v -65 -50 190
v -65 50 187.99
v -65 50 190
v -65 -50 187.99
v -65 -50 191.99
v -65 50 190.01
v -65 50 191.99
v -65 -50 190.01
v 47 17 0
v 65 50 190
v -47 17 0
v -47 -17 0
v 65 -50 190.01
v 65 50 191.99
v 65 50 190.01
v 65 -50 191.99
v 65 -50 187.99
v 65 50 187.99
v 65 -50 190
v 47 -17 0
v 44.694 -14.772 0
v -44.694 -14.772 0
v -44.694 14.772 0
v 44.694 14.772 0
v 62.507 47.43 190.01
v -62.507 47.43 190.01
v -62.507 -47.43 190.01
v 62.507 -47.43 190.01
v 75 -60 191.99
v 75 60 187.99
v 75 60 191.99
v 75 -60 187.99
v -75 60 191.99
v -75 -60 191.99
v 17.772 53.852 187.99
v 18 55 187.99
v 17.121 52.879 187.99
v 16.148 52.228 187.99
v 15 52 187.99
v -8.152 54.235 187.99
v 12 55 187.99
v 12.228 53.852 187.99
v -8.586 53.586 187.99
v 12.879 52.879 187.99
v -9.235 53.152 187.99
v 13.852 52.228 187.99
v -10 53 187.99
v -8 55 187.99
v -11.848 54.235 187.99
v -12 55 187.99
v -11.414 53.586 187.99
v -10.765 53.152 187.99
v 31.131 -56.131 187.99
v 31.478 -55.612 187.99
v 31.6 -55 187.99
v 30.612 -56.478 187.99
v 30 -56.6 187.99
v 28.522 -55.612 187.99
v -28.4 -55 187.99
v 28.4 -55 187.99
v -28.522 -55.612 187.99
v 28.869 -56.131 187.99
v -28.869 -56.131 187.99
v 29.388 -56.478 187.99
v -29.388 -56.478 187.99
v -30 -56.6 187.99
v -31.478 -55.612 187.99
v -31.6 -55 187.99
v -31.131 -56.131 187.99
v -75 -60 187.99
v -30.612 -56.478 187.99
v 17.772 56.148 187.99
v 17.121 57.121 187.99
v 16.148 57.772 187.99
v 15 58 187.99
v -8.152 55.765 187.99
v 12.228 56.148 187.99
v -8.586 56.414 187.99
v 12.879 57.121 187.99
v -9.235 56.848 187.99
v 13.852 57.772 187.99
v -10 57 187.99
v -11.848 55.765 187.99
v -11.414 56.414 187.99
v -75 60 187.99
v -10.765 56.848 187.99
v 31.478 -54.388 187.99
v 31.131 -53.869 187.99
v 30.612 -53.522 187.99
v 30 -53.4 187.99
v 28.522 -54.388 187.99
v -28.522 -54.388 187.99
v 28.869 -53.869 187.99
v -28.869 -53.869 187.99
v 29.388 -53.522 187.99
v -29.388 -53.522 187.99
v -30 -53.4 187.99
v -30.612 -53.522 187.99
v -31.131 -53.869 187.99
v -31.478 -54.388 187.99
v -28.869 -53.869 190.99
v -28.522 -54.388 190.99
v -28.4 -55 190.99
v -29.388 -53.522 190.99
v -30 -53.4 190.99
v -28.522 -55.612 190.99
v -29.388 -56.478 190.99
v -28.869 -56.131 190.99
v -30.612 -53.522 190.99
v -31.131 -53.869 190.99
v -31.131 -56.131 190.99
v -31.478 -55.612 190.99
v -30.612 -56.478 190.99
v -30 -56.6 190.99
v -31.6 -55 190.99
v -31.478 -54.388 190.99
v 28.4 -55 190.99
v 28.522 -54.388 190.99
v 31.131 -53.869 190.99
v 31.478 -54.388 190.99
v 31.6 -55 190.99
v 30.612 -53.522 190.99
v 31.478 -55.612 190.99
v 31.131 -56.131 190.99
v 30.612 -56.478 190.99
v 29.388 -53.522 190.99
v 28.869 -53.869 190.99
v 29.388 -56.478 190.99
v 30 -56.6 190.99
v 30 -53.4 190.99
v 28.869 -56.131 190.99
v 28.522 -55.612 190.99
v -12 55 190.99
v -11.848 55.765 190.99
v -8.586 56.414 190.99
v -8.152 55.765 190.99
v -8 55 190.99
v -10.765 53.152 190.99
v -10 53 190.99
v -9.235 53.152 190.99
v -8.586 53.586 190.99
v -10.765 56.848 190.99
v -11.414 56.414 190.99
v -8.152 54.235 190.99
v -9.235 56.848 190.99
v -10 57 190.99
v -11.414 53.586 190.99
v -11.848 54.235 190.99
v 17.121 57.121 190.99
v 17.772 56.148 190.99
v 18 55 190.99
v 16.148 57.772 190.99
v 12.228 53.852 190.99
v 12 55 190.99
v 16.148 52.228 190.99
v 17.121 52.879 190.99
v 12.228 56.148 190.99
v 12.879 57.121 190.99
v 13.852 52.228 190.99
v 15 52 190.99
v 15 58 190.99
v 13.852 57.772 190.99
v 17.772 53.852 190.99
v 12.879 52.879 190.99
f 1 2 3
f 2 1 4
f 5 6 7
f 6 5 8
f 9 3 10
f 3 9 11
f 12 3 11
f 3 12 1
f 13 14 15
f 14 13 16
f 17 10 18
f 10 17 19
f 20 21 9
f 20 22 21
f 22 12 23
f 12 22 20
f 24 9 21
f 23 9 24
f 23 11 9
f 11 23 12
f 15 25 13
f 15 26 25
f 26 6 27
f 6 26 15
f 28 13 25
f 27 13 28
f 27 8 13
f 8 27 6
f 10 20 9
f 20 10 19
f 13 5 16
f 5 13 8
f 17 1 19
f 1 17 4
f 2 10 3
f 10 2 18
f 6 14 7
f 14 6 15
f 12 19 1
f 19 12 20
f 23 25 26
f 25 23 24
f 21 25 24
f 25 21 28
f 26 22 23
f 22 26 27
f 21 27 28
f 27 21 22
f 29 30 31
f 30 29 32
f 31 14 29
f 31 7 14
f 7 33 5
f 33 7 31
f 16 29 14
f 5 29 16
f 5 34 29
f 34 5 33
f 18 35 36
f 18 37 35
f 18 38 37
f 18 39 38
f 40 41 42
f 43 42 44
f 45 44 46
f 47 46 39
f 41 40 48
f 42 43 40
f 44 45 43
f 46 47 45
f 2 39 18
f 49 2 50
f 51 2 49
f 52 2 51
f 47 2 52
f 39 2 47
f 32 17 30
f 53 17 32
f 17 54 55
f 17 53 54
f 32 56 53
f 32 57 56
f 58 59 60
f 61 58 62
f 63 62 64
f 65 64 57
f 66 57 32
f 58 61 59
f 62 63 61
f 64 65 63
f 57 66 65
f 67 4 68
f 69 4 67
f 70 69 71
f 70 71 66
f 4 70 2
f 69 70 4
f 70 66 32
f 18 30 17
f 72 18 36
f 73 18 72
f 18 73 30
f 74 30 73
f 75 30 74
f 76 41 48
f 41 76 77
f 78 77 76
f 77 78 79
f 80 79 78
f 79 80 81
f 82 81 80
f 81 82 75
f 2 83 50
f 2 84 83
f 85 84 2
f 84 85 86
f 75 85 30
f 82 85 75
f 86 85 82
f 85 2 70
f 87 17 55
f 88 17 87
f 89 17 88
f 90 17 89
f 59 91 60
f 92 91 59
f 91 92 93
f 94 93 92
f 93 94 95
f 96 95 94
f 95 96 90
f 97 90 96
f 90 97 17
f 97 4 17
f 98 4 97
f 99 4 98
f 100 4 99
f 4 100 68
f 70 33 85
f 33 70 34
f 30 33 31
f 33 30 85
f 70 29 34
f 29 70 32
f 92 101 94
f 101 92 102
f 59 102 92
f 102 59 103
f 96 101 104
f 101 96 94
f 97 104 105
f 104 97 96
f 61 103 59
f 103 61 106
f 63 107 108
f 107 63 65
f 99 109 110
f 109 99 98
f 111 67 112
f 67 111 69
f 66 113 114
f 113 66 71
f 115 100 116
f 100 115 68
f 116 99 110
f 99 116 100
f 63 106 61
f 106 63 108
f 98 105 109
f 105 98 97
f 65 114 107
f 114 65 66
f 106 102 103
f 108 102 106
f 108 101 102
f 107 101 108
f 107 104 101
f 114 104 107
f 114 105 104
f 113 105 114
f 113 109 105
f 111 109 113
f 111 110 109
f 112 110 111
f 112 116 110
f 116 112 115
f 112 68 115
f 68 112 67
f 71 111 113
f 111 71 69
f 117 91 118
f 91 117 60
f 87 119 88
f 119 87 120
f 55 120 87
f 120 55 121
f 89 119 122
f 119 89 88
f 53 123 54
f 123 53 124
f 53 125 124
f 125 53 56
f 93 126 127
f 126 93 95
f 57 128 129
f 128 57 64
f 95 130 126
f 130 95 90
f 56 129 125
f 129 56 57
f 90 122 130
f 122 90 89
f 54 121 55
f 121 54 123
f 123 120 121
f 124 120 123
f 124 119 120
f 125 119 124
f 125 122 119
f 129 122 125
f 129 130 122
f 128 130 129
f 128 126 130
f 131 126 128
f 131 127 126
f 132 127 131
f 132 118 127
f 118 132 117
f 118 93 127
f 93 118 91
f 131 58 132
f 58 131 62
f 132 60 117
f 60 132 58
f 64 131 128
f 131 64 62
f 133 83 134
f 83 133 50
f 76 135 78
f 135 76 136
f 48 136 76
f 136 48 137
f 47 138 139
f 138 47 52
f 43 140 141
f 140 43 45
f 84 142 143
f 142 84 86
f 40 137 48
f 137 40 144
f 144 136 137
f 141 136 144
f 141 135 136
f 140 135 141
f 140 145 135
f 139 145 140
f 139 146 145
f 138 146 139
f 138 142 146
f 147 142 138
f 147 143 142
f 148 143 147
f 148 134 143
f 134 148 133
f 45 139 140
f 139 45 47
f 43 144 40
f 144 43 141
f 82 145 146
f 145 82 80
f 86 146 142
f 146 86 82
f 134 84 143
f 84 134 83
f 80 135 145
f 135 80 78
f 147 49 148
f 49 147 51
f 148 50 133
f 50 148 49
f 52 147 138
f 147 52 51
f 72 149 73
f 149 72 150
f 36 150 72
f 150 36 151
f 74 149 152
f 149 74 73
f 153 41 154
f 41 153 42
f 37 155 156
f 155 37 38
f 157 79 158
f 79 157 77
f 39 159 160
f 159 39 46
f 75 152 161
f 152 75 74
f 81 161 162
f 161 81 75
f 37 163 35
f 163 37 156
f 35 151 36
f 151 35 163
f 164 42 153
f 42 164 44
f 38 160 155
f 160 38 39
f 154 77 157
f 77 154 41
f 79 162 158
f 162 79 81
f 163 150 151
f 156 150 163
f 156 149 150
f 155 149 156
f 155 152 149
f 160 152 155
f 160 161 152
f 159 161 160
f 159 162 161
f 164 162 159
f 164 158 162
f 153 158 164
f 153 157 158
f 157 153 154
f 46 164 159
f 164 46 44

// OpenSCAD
// file: params.scad
// Shared parameters — edit this file only, every part picks these up via
// `include`. Meccanismo: tramoggia (bulk, >=100 sigarette sfuse) -> rullo
// scanalato (singolarizzatore) -> scivolo -> pulsante frontale.
//
// MISURA LE TUE SIGARETTE PRIMA DI STAMPARE. Questi sono valori tipici per
// un formato king-size con filtro (~84mm x ~7.9mm) — verificalo con un
// calibro sulle sigarette che userai davvero (JPS o altro) e correggi.

cig_l      = 84;    // lunghezza sigaretta (mm)
cig_d      = 7.9;   // diametro sigaretta (mm)
clear_ax   = 2;      // gioco assiale (lungo il rullo) per lato
clear_rad  = 1.5;    // gioco radiale nella scanalatura

// --- Rullo scanalato ---------------------------------------------------
flutes       = 8;    // numero di scanalature attorno al rullo
wall         = 3.5;  // parete minima tra due scanalature (robustezza stampa)
shaft_d      = 6;    // foro per accoppiatore albero motore

groove_d   = cig_d + 2*clear_rad;                 // diametro scanalatura
flute_pitch_arc = groove_d + wall;                // passo tra scanalature (arco)
r_pitch    = flute_pitch_arc * flutes / (2*PI);   // raggio al centro delle scanalature
// Il grezzo del rullo si ferma esattamente al raggio r_pitch: ogni
// scanalatura è un foro cilindrico centrato SU quel raggio, quindi viene
// tagliata a metà dalla superficie del grezzo, lasciando un canale a "U"
// aperto verso l'esterno (non un foro cieco tangente alla superficie —
// un tentativo precedente con roller_r = r_pitch + groove_d/2 produceva
// una mesh non manifold, tangente in un solo punto).
roller_r   = r_pitch;                             // raggio esterno rullo (creste)
core_r     = r_pitch - groove_d/2;                // raggio al fondo scanalatura
roller_len = cig_l + 2*clear_ax;

// --- Alloggiamento (housing a "C") --------------------------------------
// Deve coprire anche la sporgenza della sigaretta oltre le creste (la
// scanalatura è più larga della sigaretta per il gioco, quindi la
// sigaretta non sta a filo — protrude di circa clear_rad..2*clear_rad).
housing_clear   = 4;                   // gioco radiale rullo/alloggiamento
housing_ir      = roller_r + housing_clear; // raggio interno alloggiamento
housing_wall    = 3;
housing_or      = housing_ir + housing_wall;
end_plate_t     = 4;

// apertura di carico (sopra, sotto la tramoggia) e di scarico (sotto)
load_gap_deg    = 55;   // ampiezza apertura di carico
discharge_gap_deg = 40; // ampiezza apertura di scarico
// l'apertura di carico è centrata in alto (90°), quella di scarico in
// basso (270°) nel piano di rotazione del rullo (asse orizzontale, vista
// dal fronte lungo l'asse Y)

// --- Tramoggia (hopper) --------------------------------------------------
// Capienza richiesta: >=100 sigarette sfuse. Volume solido di 100 sigarette
// =~ 411 cm3; per cilindretti alla rinfusa il fattore di impaccamento reale
// è basso e variabile (si intasano/incrociano) — 35-50% è una stima
// prudente. Le dimensioni sotto danno un volume utile di ~1.3 L, che
// garantisce >=100 pezzi anche nello scenario pessimistico (35%): vedi il
// conto fatto per questo file (~111 sigarette al 35%, fino a ~158 al 50%).
hopper_top_w   = 130;
hopper_top_d   = 100;
hopper_bot_w   = roller_len + 6;   // combacia con la larghezza del rullo
hopper_bot_d   = 34;
hopper_h       = 190;
hopper_wall    = 2.4;

// --- Bordo/coperchio/serratura tramoggia (hopper.scad + hopper_lid.scad) -
rim_w        = 10;   // sporgenza del bordo oltre l'apertura
rim_t        = 4;
hinge_hole_d = 3.2;
hinge_x      = [-30, 30];  // posizione viti cerniera, lato -Y (fronte)
latch_hole_d = 4;          // foro per il gancio della serratura, lato +Y (retro)
reed_hole_d  = 6;          // foro per il sensore magnetico di sportello chiuso

// --- Mobile esterno (cabinet.scad) — pannelli piatti, non stampati -------
// Un guscio 3D pieno di queste dimensioni non è stampabile in un pezzo
// solo: qui si generano pannelli piatti (taglio laser/CNC/sega) che
// racchiudono il meccanismo, lasciando accessibili solo pulsante,
// feritoia e sportello tramoggia con serratura.
cab_w        = 180;   // larghezza (sx-dx)
cab_d        = 240;   // profondità (fronte-retro)
cab_h        = 420;   // altezza
panel_mat_t  = 9;     // spessore materiale pannelli (legno 9mm o simile — adatta)
cab_back_margin = 15; // margine tra il bordo posteriore e il ritaglio tramoggia
// main file
// Tramoggia (bulk hopper) — stampa 1x. Imbuto che raccoglie le sigarette
// sfuse (>=100) e le convoglia, per gravità, nell'apertura di carico
// dell'alloggiamento (housing.scad). Capacità: vedi il calcolo in
// params.scad (hopper_*).
include <params.scad>

module loft(w1, d1, w2, d2, h) {
    hull() {
        translate([0, 0, h]) linear_extrude(0.01) square([w1, d1], center = true);
        linear_extrude(0.01) square([w2, d2], center = true);
    }
}

// bordo in cima: appoggio per il coperchio (hopper_lid.scad), sede per
// cerniera, serratura e sensore di sportello chiuso — vedi quel file.
// Parametri (rim_w, hinge_x, ecc.) in params.scad, condivisi con
// hopper_lid.scad senza dover includere questo file (che ha una hopper()
// finale — un `include` la eseguirebbe due volte).

module hopper_rim() {
    translate([0, 0, hopper_h - 0.01])
        difference() {
            union() {
                cube([hopper_top_w + 2*rim_w, hopper_top_d + 2*rim_w, rim_t], center = true);
            }
            cube([hopper_top_w, hopper_top_d, rim_t + 2], center = true);
        }
}

module hopper() {
    union() {
        difference() {
            loft(hopper_top_w, hopper_top_d, hopper_bot_w, hopper_bot_d, hopper_h);
            translate([0, 0, -1])
                loft(hopper_top_w - 2*hopper_wall, hopper_top_d - 2*hopper_wall,
                     hopper_bot_w - 2*hopper_wall, hopper_bot_d - 2*hopper_wall,
                     hopper_h + 2);
        }
        difference() {
            hopper_rim();
            // viti cerniera (lato fronte, -Y)
            for (x = hinge_x)
                translate([x, -hopper_top_d/2 - rim_w/2, hopper_h - rim_t/2 - 0.01])
                    cylinder(d = hinge_hole_d, h = rim_t + 2, center = true, $fn = 16);
            // gancio serratura + sensore (lato retro, +Y)
            translate([-10, hopper_top_d/2 + rim_w/2, hopper_h - rim_t/2 - 0.01])
                cylinder(d = latch_hole_d, h = rim_t + 2, center = true, $fn = 16);
            translate([15, hopper_top_d/2 + rim_w/2, hopper_h - rim_t/2 - 0.01])
                cylinder(d = reed_hole_d, h = rim_t + 2, center = true, $fn = 16);
        }
    }
}

hopper();
